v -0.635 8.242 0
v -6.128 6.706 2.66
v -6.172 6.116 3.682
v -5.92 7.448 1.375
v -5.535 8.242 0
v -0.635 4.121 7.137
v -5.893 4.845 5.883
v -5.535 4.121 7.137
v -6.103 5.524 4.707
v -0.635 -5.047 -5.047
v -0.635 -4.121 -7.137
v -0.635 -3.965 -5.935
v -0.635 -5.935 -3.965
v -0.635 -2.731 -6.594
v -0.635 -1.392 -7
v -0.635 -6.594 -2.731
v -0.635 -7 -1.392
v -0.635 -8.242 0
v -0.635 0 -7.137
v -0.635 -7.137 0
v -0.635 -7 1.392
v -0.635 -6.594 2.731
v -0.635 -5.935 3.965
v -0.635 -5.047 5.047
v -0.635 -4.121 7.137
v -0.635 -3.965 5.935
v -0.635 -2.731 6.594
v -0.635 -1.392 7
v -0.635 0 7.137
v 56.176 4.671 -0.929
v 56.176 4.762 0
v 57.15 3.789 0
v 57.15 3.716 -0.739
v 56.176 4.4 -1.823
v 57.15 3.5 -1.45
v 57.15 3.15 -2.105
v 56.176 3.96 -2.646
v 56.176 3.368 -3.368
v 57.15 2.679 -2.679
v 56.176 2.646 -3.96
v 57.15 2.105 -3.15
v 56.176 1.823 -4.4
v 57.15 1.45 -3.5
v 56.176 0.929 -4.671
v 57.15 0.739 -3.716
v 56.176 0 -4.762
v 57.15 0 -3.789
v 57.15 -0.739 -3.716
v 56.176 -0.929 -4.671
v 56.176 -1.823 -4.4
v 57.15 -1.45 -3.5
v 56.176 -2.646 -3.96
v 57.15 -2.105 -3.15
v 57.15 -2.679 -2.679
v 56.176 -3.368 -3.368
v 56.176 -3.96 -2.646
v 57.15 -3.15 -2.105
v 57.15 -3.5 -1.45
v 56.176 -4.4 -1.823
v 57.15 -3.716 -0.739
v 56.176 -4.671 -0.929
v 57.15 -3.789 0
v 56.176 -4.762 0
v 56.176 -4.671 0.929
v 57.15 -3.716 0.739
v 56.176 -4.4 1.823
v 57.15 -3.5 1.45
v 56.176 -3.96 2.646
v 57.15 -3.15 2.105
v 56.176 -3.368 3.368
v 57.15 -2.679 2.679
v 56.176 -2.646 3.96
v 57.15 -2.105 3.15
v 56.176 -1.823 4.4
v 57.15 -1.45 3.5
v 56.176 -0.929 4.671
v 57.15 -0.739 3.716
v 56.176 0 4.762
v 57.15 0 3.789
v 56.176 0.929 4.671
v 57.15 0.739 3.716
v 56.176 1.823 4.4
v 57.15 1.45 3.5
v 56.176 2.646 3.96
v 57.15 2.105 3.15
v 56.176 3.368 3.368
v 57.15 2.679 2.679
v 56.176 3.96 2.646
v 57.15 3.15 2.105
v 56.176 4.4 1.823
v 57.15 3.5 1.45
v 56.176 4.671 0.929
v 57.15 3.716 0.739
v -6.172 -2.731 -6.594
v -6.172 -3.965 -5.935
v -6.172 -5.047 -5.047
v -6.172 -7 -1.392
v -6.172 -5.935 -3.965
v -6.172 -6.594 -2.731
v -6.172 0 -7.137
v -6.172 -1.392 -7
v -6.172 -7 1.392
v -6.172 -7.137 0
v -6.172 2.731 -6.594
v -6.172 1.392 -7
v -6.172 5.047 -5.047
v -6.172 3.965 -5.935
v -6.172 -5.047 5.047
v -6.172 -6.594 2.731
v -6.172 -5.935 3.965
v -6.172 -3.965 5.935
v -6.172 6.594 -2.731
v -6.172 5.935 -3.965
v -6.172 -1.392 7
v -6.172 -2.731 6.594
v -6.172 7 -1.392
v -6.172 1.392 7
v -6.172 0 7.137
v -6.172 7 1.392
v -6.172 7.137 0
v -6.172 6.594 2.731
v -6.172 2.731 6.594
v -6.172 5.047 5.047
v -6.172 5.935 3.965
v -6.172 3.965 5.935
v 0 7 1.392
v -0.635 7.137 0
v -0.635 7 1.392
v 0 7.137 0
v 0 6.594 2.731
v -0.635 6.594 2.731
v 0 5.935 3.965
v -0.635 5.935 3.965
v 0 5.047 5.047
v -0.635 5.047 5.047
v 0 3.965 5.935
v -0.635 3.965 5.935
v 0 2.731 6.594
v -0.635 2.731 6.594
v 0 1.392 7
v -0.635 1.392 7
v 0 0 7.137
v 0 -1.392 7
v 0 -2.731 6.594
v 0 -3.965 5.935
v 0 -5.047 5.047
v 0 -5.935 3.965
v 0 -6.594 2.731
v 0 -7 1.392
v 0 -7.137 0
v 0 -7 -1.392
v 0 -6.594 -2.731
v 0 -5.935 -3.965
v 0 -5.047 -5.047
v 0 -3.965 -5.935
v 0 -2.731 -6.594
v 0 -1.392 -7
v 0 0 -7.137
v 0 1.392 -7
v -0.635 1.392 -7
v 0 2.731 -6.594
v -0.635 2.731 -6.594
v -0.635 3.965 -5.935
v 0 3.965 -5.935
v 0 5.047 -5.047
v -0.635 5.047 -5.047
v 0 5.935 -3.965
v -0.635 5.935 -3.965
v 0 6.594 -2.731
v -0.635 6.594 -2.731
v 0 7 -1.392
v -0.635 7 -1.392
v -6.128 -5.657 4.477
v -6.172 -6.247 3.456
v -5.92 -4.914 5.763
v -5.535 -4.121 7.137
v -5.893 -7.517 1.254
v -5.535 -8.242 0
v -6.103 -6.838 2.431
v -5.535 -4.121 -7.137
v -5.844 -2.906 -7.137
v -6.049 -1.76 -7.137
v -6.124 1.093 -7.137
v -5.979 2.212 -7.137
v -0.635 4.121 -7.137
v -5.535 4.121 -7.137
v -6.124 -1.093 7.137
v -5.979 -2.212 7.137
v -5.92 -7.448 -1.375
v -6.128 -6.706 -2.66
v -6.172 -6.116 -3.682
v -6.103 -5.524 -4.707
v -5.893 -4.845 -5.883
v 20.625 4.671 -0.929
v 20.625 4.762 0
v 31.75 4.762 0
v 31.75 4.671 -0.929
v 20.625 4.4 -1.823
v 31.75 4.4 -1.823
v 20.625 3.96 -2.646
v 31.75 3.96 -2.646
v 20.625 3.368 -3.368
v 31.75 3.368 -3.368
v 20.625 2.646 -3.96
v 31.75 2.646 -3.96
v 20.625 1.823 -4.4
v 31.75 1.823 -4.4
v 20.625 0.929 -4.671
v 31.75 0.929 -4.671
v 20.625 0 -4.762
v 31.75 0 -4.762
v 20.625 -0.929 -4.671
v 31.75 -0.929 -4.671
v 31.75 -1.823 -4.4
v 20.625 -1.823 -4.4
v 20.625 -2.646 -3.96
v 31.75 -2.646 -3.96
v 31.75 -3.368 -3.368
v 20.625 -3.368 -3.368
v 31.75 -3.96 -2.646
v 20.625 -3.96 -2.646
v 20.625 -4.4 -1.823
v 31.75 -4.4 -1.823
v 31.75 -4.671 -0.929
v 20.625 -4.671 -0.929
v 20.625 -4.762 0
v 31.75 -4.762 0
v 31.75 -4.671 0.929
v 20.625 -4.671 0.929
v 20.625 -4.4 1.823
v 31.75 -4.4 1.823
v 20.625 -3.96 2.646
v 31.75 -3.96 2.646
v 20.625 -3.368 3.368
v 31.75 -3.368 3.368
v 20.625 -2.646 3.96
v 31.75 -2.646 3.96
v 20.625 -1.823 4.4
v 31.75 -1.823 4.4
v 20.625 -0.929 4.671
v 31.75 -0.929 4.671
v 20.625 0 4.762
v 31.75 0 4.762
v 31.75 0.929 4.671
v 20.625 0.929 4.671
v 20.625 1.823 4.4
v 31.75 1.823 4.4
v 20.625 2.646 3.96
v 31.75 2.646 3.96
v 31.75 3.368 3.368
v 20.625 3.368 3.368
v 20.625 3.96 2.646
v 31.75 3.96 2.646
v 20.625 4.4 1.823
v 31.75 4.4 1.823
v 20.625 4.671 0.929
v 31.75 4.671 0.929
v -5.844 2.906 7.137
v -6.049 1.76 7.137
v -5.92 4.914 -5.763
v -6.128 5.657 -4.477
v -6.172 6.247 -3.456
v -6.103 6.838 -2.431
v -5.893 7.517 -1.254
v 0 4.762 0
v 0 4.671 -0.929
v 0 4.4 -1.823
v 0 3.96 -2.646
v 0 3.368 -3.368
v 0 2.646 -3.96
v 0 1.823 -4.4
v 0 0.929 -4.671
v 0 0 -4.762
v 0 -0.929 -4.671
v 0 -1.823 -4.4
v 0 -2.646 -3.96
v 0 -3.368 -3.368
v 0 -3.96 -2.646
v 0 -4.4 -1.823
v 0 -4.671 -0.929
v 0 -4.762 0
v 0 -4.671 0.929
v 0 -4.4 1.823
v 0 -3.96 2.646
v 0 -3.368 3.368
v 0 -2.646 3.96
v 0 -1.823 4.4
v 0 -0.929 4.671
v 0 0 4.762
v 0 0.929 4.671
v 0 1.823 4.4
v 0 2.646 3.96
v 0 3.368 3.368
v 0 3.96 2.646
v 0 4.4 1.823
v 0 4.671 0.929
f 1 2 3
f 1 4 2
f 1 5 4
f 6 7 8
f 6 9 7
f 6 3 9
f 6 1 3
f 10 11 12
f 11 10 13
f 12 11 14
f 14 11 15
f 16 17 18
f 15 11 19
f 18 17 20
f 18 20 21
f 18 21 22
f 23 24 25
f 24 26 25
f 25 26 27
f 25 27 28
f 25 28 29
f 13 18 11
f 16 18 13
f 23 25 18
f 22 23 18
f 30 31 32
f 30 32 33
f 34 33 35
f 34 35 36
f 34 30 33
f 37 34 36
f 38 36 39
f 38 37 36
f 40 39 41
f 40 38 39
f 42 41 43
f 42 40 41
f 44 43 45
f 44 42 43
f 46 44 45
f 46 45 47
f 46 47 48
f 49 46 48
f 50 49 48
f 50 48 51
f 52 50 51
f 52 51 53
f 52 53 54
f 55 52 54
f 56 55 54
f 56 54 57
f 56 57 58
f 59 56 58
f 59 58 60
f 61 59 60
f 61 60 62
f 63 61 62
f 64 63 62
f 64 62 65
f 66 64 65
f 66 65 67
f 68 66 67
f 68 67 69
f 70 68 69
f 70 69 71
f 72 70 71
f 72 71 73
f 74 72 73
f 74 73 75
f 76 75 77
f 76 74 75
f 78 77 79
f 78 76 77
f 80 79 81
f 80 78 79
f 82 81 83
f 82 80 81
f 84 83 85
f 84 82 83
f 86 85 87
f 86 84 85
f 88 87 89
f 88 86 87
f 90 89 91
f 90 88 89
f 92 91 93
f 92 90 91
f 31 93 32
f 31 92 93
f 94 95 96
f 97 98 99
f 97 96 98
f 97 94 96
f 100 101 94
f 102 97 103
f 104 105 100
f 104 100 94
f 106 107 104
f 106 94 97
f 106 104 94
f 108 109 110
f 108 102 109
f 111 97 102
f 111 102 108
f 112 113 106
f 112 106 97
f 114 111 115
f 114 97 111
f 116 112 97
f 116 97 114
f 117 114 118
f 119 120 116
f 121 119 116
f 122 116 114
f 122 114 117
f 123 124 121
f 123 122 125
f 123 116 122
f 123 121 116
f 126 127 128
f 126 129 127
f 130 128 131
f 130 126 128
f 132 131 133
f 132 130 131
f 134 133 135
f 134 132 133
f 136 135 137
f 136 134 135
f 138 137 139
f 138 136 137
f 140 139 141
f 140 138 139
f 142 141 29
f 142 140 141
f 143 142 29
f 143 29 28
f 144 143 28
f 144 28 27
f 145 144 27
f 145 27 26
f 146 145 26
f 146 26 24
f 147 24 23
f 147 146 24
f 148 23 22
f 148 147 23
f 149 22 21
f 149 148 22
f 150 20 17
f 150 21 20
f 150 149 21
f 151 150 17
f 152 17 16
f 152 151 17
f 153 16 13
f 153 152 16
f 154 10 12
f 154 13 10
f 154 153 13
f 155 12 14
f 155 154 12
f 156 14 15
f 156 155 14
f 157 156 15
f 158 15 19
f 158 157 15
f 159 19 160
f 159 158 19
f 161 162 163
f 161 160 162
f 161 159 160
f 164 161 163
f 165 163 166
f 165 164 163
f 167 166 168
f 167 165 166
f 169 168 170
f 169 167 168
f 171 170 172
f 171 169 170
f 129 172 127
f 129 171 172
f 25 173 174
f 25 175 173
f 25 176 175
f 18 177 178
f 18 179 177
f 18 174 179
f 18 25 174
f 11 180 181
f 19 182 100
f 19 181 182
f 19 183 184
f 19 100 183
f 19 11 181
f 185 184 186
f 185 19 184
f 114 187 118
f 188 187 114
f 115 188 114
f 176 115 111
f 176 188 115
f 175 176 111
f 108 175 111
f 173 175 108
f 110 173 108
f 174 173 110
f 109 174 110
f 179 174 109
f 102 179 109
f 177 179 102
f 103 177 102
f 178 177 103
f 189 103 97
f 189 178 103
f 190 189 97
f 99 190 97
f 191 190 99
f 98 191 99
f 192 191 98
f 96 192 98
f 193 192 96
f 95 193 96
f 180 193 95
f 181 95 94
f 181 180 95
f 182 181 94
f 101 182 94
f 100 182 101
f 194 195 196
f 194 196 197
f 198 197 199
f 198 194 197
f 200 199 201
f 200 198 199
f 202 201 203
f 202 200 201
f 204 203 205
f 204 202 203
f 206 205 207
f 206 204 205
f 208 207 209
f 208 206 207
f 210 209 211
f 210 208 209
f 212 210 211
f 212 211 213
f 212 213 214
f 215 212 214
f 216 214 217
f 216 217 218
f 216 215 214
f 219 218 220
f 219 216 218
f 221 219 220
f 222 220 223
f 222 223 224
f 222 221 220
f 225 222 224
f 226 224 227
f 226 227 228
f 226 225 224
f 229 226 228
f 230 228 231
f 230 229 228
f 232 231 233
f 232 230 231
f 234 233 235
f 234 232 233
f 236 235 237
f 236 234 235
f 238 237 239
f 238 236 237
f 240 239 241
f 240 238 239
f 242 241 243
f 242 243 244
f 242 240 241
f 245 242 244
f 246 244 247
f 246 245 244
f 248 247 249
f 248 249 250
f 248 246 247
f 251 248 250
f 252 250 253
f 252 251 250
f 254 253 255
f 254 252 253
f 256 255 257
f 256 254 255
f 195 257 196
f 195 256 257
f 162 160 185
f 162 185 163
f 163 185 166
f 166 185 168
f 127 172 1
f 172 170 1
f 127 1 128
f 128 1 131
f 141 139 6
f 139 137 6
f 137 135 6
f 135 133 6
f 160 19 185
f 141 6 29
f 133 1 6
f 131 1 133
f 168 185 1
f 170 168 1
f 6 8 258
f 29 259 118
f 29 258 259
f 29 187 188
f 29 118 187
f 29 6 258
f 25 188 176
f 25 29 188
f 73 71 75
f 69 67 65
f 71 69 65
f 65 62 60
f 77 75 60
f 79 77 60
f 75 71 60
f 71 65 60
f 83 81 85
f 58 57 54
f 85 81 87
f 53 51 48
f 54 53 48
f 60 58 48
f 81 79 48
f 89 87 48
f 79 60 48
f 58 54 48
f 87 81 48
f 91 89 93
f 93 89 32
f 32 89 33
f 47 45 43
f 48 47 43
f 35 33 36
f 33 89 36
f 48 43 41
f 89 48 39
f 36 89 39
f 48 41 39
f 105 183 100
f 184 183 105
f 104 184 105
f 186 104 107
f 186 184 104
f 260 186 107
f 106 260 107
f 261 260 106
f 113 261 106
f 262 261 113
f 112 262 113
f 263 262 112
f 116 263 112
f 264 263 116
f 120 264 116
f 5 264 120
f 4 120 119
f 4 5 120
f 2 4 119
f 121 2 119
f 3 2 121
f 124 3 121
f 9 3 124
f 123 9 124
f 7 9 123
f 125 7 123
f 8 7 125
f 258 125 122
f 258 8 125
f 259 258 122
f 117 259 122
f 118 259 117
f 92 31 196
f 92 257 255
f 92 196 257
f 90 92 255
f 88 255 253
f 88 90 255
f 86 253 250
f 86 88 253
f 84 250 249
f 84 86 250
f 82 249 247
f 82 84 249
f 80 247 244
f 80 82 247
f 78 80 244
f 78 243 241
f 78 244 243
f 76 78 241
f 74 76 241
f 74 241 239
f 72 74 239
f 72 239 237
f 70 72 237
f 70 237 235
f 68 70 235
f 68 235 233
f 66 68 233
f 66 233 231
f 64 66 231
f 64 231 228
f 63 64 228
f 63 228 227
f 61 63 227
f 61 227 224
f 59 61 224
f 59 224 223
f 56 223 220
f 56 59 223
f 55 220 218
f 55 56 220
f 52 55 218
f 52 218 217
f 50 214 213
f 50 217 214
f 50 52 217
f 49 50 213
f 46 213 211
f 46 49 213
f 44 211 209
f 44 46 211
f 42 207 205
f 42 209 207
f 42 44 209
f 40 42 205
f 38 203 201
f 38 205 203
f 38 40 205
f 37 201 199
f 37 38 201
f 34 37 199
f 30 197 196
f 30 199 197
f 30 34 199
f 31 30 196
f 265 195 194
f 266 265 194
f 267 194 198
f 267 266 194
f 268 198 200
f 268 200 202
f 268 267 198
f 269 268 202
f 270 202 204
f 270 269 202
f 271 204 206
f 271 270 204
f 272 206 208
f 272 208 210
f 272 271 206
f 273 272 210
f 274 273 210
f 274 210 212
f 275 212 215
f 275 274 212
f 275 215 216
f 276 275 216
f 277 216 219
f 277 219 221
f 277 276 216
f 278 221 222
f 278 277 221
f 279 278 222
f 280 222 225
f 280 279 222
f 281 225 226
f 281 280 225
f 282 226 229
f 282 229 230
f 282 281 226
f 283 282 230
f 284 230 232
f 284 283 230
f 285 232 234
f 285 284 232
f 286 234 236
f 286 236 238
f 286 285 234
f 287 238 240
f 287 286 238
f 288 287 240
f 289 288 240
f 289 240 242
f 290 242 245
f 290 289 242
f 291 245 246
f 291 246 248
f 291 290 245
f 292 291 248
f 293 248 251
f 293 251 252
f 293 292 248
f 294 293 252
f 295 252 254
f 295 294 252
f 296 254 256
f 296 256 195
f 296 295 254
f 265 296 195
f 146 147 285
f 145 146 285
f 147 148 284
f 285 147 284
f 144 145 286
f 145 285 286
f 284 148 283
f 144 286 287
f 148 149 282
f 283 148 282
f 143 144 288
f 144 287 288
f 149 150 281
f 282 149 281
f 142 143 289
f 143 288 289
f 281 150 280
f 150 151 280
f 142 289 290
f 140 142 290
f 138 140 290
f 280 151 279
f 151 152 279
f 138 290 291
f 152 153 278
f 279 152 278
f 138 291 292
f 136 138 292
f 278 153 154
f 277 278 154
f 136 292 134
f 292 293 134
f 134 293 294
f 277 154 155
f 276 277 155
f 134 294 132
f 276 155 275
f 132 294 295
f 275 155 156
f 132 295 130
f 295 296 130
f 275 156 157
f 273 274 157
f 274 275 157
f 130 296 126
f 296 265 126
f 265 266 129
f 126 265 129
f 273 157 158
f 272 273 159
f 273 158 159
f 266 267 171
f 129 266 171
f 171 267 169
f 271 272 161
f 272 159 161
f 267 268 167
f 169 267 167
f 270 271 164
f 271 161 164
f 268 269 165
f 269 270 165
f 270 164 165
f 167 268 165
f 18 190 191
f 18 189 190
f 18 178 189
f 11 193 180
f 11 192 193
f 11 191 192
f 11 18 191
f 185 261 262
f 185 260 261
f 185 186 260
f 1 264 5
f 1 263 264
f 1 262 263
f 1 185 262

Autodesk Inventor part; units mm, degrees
ref_plane "YZ Plane" through (0, 0, 0) normal (1, 0, 0) x (0, 1, 0)
ref_plane "XZ Plane" through (0, 0, 0) normal (0, 1, 0) x (-1, 0, 0)
sketch "Sketch1" plane through (0, 0, 0) normal (0, 0, 1) x (1, 0, 0)
  line L0 (0, 7.1374) -> (0, 4.7625)
  line L1 (31.75, 4.7625) -> (57.15, 4.7625)
  line L2 (57.15, 4.7625) -> (57.15, 0)
  line L3 (57.15, 0) -> (-0.6351, 0)
  line L4 (-12.1921, 0) -> (68.707, 0) projected
  line L5 (-0.6351, 0) -> (-0.6351, 7.1374)
  line L6 (-0.6351, 7.1374) -> (0, 7.1374)
  line L7 (31.75, 4.7625) -> (20.6247, 4.7625)
  line L8 (20.6247, 4.7625) -> (0, 4.7625)
  line L9 (0, -1.4275) -> (0, 8.5649) projected
  dimension "d0" = 57.15
  dimension "d1" = 25.4
  dimension "d2" = 9.525
  dimension "d9" = 0.6351
  dimension "d10" = 14.2748
  dimension "d13" = 11.1253
  dimension "d14" = 9.525
revolve "Body" add sketch "Sketch1" angle 360 about axis through (57.15, 0, 0) along (-1, 0, 0)
sketch "Sketch2" plane through (-0.6351, 0, 0) normal (-1, 0, 0) x (0, 0, 1)
  line L0 (0, 8.2416) -> (7.1374, 4.1208)
  line L1 (7.1374, 4.1208) -> (7.1374, -4.1208)
  line L2 (7.1374, -4.1208) -> (0, -8.2416)
  line L3 (0, -8.2416) -> (-7.1374, -4.1208)
  line L4 (-7.1374, -4.1208) -> (-7.1374, 4.1208)
  line L5 (-7.1374, 4.1208) -> (0, 8.2416)
  point P0 (0, 0)
  point P1 (0, 0)
  dimension "d11" = 14.2748
extrude "Head" add sketch "Sketch2" along normal blind 5.5372
sketch "Sketch4" plane through (0, 0, 0) normal (0, 0, 1) x (1, 0, 0)
  line L0 (-6.1723, 7.1374) -> (-6.1723, 8.2416)
  line L1 (-6.1723, 8.2416) -> (-5.5348, 8.2416)
  line L2 (-5.5348, 8.2416) -> (-6.1723, 7.1374)
  line L3 (-7.2797, 0) -> (0.4723, 0) projected
  line L4 (-0.6351, 8.2416) -> (-6.1723, 8.2416) projected
  line L5 (-6.1723, 4.1208) -> (-6.1723, 8.2416) projected
  dimension "d5" = 30
  dimension "d19" = 14.2748
revolve "Chamfer1" cut sketch "Sketch4" angle 360 about axis through (-10, 0, 0) along (1, 0, 0)
thread "Thread" size "3/8-16 UNC" class "2A" standard "ANSI Unified Screw Threads" length 25.4
chamfer "Chamfer2" distance 0.9738 distance2 0.9739 1 edges at (57.15, -4.7625, 0) measured on face at (57.15, 0.9018, -1.6622)
ref_plane "Work Plane1" through (1.525, 0, 0) normal (0, 0, 1) x (1, 0, 0)
equation "\"d0\" = NLG"
equation "\"d1\" = GEL"
equation "\"d2\" = GD"
equation "\"d10\" = SD2"
equation "\"d14\" = BDM"
equation "\"d11\" = SW"
equation "\"d3\" = KOH - SD"
equation "\"d5\" = ANG1"
equation "\"d19\" = SW0"
equation "\"d15\" = GEL"
equation "\"d6\" = -0.5 * SPD + 0.5 * GD"
equation "\"NLG\" = 57.15"
equation "\"GD\" = 9.525"
equation "\"BDM\" = 9.525"
equation "\"KOH\" = 6.1722"
equation "\"GEL\" = 25.4"
equation "\"SW\" = 14.2748"
equation "\"SW0\" = SW"
equation "\"SPD\" = GD1"
equation "\"SD2\" = SW"
equation "\"SD\" = 0.635"
equation "\"ANG1\" = 30deg"
equation "\"GAL\" = 11.1252"
equation "\"GUL\" = 0.97384"
equation "\"RR\" = 0.381"
equation "\"WFT\" = SD"
equation "\"GD1\" = 7.57733"
equation "\"THREADDIA\" = 9.525"
equation "\"SDH\" = SW"
equation "\"SDHG\" = 20.6248"
equation "\"TOA\" = 30deg"
equation "\"FAWI\" = 45deg"
equation "\"NND\" = 9.525"
equation "\"E0\" = 16.48739"
properties part number "AS 2465 - 3/8 x 2 1/4  UNC" material "Steel, Mild"
